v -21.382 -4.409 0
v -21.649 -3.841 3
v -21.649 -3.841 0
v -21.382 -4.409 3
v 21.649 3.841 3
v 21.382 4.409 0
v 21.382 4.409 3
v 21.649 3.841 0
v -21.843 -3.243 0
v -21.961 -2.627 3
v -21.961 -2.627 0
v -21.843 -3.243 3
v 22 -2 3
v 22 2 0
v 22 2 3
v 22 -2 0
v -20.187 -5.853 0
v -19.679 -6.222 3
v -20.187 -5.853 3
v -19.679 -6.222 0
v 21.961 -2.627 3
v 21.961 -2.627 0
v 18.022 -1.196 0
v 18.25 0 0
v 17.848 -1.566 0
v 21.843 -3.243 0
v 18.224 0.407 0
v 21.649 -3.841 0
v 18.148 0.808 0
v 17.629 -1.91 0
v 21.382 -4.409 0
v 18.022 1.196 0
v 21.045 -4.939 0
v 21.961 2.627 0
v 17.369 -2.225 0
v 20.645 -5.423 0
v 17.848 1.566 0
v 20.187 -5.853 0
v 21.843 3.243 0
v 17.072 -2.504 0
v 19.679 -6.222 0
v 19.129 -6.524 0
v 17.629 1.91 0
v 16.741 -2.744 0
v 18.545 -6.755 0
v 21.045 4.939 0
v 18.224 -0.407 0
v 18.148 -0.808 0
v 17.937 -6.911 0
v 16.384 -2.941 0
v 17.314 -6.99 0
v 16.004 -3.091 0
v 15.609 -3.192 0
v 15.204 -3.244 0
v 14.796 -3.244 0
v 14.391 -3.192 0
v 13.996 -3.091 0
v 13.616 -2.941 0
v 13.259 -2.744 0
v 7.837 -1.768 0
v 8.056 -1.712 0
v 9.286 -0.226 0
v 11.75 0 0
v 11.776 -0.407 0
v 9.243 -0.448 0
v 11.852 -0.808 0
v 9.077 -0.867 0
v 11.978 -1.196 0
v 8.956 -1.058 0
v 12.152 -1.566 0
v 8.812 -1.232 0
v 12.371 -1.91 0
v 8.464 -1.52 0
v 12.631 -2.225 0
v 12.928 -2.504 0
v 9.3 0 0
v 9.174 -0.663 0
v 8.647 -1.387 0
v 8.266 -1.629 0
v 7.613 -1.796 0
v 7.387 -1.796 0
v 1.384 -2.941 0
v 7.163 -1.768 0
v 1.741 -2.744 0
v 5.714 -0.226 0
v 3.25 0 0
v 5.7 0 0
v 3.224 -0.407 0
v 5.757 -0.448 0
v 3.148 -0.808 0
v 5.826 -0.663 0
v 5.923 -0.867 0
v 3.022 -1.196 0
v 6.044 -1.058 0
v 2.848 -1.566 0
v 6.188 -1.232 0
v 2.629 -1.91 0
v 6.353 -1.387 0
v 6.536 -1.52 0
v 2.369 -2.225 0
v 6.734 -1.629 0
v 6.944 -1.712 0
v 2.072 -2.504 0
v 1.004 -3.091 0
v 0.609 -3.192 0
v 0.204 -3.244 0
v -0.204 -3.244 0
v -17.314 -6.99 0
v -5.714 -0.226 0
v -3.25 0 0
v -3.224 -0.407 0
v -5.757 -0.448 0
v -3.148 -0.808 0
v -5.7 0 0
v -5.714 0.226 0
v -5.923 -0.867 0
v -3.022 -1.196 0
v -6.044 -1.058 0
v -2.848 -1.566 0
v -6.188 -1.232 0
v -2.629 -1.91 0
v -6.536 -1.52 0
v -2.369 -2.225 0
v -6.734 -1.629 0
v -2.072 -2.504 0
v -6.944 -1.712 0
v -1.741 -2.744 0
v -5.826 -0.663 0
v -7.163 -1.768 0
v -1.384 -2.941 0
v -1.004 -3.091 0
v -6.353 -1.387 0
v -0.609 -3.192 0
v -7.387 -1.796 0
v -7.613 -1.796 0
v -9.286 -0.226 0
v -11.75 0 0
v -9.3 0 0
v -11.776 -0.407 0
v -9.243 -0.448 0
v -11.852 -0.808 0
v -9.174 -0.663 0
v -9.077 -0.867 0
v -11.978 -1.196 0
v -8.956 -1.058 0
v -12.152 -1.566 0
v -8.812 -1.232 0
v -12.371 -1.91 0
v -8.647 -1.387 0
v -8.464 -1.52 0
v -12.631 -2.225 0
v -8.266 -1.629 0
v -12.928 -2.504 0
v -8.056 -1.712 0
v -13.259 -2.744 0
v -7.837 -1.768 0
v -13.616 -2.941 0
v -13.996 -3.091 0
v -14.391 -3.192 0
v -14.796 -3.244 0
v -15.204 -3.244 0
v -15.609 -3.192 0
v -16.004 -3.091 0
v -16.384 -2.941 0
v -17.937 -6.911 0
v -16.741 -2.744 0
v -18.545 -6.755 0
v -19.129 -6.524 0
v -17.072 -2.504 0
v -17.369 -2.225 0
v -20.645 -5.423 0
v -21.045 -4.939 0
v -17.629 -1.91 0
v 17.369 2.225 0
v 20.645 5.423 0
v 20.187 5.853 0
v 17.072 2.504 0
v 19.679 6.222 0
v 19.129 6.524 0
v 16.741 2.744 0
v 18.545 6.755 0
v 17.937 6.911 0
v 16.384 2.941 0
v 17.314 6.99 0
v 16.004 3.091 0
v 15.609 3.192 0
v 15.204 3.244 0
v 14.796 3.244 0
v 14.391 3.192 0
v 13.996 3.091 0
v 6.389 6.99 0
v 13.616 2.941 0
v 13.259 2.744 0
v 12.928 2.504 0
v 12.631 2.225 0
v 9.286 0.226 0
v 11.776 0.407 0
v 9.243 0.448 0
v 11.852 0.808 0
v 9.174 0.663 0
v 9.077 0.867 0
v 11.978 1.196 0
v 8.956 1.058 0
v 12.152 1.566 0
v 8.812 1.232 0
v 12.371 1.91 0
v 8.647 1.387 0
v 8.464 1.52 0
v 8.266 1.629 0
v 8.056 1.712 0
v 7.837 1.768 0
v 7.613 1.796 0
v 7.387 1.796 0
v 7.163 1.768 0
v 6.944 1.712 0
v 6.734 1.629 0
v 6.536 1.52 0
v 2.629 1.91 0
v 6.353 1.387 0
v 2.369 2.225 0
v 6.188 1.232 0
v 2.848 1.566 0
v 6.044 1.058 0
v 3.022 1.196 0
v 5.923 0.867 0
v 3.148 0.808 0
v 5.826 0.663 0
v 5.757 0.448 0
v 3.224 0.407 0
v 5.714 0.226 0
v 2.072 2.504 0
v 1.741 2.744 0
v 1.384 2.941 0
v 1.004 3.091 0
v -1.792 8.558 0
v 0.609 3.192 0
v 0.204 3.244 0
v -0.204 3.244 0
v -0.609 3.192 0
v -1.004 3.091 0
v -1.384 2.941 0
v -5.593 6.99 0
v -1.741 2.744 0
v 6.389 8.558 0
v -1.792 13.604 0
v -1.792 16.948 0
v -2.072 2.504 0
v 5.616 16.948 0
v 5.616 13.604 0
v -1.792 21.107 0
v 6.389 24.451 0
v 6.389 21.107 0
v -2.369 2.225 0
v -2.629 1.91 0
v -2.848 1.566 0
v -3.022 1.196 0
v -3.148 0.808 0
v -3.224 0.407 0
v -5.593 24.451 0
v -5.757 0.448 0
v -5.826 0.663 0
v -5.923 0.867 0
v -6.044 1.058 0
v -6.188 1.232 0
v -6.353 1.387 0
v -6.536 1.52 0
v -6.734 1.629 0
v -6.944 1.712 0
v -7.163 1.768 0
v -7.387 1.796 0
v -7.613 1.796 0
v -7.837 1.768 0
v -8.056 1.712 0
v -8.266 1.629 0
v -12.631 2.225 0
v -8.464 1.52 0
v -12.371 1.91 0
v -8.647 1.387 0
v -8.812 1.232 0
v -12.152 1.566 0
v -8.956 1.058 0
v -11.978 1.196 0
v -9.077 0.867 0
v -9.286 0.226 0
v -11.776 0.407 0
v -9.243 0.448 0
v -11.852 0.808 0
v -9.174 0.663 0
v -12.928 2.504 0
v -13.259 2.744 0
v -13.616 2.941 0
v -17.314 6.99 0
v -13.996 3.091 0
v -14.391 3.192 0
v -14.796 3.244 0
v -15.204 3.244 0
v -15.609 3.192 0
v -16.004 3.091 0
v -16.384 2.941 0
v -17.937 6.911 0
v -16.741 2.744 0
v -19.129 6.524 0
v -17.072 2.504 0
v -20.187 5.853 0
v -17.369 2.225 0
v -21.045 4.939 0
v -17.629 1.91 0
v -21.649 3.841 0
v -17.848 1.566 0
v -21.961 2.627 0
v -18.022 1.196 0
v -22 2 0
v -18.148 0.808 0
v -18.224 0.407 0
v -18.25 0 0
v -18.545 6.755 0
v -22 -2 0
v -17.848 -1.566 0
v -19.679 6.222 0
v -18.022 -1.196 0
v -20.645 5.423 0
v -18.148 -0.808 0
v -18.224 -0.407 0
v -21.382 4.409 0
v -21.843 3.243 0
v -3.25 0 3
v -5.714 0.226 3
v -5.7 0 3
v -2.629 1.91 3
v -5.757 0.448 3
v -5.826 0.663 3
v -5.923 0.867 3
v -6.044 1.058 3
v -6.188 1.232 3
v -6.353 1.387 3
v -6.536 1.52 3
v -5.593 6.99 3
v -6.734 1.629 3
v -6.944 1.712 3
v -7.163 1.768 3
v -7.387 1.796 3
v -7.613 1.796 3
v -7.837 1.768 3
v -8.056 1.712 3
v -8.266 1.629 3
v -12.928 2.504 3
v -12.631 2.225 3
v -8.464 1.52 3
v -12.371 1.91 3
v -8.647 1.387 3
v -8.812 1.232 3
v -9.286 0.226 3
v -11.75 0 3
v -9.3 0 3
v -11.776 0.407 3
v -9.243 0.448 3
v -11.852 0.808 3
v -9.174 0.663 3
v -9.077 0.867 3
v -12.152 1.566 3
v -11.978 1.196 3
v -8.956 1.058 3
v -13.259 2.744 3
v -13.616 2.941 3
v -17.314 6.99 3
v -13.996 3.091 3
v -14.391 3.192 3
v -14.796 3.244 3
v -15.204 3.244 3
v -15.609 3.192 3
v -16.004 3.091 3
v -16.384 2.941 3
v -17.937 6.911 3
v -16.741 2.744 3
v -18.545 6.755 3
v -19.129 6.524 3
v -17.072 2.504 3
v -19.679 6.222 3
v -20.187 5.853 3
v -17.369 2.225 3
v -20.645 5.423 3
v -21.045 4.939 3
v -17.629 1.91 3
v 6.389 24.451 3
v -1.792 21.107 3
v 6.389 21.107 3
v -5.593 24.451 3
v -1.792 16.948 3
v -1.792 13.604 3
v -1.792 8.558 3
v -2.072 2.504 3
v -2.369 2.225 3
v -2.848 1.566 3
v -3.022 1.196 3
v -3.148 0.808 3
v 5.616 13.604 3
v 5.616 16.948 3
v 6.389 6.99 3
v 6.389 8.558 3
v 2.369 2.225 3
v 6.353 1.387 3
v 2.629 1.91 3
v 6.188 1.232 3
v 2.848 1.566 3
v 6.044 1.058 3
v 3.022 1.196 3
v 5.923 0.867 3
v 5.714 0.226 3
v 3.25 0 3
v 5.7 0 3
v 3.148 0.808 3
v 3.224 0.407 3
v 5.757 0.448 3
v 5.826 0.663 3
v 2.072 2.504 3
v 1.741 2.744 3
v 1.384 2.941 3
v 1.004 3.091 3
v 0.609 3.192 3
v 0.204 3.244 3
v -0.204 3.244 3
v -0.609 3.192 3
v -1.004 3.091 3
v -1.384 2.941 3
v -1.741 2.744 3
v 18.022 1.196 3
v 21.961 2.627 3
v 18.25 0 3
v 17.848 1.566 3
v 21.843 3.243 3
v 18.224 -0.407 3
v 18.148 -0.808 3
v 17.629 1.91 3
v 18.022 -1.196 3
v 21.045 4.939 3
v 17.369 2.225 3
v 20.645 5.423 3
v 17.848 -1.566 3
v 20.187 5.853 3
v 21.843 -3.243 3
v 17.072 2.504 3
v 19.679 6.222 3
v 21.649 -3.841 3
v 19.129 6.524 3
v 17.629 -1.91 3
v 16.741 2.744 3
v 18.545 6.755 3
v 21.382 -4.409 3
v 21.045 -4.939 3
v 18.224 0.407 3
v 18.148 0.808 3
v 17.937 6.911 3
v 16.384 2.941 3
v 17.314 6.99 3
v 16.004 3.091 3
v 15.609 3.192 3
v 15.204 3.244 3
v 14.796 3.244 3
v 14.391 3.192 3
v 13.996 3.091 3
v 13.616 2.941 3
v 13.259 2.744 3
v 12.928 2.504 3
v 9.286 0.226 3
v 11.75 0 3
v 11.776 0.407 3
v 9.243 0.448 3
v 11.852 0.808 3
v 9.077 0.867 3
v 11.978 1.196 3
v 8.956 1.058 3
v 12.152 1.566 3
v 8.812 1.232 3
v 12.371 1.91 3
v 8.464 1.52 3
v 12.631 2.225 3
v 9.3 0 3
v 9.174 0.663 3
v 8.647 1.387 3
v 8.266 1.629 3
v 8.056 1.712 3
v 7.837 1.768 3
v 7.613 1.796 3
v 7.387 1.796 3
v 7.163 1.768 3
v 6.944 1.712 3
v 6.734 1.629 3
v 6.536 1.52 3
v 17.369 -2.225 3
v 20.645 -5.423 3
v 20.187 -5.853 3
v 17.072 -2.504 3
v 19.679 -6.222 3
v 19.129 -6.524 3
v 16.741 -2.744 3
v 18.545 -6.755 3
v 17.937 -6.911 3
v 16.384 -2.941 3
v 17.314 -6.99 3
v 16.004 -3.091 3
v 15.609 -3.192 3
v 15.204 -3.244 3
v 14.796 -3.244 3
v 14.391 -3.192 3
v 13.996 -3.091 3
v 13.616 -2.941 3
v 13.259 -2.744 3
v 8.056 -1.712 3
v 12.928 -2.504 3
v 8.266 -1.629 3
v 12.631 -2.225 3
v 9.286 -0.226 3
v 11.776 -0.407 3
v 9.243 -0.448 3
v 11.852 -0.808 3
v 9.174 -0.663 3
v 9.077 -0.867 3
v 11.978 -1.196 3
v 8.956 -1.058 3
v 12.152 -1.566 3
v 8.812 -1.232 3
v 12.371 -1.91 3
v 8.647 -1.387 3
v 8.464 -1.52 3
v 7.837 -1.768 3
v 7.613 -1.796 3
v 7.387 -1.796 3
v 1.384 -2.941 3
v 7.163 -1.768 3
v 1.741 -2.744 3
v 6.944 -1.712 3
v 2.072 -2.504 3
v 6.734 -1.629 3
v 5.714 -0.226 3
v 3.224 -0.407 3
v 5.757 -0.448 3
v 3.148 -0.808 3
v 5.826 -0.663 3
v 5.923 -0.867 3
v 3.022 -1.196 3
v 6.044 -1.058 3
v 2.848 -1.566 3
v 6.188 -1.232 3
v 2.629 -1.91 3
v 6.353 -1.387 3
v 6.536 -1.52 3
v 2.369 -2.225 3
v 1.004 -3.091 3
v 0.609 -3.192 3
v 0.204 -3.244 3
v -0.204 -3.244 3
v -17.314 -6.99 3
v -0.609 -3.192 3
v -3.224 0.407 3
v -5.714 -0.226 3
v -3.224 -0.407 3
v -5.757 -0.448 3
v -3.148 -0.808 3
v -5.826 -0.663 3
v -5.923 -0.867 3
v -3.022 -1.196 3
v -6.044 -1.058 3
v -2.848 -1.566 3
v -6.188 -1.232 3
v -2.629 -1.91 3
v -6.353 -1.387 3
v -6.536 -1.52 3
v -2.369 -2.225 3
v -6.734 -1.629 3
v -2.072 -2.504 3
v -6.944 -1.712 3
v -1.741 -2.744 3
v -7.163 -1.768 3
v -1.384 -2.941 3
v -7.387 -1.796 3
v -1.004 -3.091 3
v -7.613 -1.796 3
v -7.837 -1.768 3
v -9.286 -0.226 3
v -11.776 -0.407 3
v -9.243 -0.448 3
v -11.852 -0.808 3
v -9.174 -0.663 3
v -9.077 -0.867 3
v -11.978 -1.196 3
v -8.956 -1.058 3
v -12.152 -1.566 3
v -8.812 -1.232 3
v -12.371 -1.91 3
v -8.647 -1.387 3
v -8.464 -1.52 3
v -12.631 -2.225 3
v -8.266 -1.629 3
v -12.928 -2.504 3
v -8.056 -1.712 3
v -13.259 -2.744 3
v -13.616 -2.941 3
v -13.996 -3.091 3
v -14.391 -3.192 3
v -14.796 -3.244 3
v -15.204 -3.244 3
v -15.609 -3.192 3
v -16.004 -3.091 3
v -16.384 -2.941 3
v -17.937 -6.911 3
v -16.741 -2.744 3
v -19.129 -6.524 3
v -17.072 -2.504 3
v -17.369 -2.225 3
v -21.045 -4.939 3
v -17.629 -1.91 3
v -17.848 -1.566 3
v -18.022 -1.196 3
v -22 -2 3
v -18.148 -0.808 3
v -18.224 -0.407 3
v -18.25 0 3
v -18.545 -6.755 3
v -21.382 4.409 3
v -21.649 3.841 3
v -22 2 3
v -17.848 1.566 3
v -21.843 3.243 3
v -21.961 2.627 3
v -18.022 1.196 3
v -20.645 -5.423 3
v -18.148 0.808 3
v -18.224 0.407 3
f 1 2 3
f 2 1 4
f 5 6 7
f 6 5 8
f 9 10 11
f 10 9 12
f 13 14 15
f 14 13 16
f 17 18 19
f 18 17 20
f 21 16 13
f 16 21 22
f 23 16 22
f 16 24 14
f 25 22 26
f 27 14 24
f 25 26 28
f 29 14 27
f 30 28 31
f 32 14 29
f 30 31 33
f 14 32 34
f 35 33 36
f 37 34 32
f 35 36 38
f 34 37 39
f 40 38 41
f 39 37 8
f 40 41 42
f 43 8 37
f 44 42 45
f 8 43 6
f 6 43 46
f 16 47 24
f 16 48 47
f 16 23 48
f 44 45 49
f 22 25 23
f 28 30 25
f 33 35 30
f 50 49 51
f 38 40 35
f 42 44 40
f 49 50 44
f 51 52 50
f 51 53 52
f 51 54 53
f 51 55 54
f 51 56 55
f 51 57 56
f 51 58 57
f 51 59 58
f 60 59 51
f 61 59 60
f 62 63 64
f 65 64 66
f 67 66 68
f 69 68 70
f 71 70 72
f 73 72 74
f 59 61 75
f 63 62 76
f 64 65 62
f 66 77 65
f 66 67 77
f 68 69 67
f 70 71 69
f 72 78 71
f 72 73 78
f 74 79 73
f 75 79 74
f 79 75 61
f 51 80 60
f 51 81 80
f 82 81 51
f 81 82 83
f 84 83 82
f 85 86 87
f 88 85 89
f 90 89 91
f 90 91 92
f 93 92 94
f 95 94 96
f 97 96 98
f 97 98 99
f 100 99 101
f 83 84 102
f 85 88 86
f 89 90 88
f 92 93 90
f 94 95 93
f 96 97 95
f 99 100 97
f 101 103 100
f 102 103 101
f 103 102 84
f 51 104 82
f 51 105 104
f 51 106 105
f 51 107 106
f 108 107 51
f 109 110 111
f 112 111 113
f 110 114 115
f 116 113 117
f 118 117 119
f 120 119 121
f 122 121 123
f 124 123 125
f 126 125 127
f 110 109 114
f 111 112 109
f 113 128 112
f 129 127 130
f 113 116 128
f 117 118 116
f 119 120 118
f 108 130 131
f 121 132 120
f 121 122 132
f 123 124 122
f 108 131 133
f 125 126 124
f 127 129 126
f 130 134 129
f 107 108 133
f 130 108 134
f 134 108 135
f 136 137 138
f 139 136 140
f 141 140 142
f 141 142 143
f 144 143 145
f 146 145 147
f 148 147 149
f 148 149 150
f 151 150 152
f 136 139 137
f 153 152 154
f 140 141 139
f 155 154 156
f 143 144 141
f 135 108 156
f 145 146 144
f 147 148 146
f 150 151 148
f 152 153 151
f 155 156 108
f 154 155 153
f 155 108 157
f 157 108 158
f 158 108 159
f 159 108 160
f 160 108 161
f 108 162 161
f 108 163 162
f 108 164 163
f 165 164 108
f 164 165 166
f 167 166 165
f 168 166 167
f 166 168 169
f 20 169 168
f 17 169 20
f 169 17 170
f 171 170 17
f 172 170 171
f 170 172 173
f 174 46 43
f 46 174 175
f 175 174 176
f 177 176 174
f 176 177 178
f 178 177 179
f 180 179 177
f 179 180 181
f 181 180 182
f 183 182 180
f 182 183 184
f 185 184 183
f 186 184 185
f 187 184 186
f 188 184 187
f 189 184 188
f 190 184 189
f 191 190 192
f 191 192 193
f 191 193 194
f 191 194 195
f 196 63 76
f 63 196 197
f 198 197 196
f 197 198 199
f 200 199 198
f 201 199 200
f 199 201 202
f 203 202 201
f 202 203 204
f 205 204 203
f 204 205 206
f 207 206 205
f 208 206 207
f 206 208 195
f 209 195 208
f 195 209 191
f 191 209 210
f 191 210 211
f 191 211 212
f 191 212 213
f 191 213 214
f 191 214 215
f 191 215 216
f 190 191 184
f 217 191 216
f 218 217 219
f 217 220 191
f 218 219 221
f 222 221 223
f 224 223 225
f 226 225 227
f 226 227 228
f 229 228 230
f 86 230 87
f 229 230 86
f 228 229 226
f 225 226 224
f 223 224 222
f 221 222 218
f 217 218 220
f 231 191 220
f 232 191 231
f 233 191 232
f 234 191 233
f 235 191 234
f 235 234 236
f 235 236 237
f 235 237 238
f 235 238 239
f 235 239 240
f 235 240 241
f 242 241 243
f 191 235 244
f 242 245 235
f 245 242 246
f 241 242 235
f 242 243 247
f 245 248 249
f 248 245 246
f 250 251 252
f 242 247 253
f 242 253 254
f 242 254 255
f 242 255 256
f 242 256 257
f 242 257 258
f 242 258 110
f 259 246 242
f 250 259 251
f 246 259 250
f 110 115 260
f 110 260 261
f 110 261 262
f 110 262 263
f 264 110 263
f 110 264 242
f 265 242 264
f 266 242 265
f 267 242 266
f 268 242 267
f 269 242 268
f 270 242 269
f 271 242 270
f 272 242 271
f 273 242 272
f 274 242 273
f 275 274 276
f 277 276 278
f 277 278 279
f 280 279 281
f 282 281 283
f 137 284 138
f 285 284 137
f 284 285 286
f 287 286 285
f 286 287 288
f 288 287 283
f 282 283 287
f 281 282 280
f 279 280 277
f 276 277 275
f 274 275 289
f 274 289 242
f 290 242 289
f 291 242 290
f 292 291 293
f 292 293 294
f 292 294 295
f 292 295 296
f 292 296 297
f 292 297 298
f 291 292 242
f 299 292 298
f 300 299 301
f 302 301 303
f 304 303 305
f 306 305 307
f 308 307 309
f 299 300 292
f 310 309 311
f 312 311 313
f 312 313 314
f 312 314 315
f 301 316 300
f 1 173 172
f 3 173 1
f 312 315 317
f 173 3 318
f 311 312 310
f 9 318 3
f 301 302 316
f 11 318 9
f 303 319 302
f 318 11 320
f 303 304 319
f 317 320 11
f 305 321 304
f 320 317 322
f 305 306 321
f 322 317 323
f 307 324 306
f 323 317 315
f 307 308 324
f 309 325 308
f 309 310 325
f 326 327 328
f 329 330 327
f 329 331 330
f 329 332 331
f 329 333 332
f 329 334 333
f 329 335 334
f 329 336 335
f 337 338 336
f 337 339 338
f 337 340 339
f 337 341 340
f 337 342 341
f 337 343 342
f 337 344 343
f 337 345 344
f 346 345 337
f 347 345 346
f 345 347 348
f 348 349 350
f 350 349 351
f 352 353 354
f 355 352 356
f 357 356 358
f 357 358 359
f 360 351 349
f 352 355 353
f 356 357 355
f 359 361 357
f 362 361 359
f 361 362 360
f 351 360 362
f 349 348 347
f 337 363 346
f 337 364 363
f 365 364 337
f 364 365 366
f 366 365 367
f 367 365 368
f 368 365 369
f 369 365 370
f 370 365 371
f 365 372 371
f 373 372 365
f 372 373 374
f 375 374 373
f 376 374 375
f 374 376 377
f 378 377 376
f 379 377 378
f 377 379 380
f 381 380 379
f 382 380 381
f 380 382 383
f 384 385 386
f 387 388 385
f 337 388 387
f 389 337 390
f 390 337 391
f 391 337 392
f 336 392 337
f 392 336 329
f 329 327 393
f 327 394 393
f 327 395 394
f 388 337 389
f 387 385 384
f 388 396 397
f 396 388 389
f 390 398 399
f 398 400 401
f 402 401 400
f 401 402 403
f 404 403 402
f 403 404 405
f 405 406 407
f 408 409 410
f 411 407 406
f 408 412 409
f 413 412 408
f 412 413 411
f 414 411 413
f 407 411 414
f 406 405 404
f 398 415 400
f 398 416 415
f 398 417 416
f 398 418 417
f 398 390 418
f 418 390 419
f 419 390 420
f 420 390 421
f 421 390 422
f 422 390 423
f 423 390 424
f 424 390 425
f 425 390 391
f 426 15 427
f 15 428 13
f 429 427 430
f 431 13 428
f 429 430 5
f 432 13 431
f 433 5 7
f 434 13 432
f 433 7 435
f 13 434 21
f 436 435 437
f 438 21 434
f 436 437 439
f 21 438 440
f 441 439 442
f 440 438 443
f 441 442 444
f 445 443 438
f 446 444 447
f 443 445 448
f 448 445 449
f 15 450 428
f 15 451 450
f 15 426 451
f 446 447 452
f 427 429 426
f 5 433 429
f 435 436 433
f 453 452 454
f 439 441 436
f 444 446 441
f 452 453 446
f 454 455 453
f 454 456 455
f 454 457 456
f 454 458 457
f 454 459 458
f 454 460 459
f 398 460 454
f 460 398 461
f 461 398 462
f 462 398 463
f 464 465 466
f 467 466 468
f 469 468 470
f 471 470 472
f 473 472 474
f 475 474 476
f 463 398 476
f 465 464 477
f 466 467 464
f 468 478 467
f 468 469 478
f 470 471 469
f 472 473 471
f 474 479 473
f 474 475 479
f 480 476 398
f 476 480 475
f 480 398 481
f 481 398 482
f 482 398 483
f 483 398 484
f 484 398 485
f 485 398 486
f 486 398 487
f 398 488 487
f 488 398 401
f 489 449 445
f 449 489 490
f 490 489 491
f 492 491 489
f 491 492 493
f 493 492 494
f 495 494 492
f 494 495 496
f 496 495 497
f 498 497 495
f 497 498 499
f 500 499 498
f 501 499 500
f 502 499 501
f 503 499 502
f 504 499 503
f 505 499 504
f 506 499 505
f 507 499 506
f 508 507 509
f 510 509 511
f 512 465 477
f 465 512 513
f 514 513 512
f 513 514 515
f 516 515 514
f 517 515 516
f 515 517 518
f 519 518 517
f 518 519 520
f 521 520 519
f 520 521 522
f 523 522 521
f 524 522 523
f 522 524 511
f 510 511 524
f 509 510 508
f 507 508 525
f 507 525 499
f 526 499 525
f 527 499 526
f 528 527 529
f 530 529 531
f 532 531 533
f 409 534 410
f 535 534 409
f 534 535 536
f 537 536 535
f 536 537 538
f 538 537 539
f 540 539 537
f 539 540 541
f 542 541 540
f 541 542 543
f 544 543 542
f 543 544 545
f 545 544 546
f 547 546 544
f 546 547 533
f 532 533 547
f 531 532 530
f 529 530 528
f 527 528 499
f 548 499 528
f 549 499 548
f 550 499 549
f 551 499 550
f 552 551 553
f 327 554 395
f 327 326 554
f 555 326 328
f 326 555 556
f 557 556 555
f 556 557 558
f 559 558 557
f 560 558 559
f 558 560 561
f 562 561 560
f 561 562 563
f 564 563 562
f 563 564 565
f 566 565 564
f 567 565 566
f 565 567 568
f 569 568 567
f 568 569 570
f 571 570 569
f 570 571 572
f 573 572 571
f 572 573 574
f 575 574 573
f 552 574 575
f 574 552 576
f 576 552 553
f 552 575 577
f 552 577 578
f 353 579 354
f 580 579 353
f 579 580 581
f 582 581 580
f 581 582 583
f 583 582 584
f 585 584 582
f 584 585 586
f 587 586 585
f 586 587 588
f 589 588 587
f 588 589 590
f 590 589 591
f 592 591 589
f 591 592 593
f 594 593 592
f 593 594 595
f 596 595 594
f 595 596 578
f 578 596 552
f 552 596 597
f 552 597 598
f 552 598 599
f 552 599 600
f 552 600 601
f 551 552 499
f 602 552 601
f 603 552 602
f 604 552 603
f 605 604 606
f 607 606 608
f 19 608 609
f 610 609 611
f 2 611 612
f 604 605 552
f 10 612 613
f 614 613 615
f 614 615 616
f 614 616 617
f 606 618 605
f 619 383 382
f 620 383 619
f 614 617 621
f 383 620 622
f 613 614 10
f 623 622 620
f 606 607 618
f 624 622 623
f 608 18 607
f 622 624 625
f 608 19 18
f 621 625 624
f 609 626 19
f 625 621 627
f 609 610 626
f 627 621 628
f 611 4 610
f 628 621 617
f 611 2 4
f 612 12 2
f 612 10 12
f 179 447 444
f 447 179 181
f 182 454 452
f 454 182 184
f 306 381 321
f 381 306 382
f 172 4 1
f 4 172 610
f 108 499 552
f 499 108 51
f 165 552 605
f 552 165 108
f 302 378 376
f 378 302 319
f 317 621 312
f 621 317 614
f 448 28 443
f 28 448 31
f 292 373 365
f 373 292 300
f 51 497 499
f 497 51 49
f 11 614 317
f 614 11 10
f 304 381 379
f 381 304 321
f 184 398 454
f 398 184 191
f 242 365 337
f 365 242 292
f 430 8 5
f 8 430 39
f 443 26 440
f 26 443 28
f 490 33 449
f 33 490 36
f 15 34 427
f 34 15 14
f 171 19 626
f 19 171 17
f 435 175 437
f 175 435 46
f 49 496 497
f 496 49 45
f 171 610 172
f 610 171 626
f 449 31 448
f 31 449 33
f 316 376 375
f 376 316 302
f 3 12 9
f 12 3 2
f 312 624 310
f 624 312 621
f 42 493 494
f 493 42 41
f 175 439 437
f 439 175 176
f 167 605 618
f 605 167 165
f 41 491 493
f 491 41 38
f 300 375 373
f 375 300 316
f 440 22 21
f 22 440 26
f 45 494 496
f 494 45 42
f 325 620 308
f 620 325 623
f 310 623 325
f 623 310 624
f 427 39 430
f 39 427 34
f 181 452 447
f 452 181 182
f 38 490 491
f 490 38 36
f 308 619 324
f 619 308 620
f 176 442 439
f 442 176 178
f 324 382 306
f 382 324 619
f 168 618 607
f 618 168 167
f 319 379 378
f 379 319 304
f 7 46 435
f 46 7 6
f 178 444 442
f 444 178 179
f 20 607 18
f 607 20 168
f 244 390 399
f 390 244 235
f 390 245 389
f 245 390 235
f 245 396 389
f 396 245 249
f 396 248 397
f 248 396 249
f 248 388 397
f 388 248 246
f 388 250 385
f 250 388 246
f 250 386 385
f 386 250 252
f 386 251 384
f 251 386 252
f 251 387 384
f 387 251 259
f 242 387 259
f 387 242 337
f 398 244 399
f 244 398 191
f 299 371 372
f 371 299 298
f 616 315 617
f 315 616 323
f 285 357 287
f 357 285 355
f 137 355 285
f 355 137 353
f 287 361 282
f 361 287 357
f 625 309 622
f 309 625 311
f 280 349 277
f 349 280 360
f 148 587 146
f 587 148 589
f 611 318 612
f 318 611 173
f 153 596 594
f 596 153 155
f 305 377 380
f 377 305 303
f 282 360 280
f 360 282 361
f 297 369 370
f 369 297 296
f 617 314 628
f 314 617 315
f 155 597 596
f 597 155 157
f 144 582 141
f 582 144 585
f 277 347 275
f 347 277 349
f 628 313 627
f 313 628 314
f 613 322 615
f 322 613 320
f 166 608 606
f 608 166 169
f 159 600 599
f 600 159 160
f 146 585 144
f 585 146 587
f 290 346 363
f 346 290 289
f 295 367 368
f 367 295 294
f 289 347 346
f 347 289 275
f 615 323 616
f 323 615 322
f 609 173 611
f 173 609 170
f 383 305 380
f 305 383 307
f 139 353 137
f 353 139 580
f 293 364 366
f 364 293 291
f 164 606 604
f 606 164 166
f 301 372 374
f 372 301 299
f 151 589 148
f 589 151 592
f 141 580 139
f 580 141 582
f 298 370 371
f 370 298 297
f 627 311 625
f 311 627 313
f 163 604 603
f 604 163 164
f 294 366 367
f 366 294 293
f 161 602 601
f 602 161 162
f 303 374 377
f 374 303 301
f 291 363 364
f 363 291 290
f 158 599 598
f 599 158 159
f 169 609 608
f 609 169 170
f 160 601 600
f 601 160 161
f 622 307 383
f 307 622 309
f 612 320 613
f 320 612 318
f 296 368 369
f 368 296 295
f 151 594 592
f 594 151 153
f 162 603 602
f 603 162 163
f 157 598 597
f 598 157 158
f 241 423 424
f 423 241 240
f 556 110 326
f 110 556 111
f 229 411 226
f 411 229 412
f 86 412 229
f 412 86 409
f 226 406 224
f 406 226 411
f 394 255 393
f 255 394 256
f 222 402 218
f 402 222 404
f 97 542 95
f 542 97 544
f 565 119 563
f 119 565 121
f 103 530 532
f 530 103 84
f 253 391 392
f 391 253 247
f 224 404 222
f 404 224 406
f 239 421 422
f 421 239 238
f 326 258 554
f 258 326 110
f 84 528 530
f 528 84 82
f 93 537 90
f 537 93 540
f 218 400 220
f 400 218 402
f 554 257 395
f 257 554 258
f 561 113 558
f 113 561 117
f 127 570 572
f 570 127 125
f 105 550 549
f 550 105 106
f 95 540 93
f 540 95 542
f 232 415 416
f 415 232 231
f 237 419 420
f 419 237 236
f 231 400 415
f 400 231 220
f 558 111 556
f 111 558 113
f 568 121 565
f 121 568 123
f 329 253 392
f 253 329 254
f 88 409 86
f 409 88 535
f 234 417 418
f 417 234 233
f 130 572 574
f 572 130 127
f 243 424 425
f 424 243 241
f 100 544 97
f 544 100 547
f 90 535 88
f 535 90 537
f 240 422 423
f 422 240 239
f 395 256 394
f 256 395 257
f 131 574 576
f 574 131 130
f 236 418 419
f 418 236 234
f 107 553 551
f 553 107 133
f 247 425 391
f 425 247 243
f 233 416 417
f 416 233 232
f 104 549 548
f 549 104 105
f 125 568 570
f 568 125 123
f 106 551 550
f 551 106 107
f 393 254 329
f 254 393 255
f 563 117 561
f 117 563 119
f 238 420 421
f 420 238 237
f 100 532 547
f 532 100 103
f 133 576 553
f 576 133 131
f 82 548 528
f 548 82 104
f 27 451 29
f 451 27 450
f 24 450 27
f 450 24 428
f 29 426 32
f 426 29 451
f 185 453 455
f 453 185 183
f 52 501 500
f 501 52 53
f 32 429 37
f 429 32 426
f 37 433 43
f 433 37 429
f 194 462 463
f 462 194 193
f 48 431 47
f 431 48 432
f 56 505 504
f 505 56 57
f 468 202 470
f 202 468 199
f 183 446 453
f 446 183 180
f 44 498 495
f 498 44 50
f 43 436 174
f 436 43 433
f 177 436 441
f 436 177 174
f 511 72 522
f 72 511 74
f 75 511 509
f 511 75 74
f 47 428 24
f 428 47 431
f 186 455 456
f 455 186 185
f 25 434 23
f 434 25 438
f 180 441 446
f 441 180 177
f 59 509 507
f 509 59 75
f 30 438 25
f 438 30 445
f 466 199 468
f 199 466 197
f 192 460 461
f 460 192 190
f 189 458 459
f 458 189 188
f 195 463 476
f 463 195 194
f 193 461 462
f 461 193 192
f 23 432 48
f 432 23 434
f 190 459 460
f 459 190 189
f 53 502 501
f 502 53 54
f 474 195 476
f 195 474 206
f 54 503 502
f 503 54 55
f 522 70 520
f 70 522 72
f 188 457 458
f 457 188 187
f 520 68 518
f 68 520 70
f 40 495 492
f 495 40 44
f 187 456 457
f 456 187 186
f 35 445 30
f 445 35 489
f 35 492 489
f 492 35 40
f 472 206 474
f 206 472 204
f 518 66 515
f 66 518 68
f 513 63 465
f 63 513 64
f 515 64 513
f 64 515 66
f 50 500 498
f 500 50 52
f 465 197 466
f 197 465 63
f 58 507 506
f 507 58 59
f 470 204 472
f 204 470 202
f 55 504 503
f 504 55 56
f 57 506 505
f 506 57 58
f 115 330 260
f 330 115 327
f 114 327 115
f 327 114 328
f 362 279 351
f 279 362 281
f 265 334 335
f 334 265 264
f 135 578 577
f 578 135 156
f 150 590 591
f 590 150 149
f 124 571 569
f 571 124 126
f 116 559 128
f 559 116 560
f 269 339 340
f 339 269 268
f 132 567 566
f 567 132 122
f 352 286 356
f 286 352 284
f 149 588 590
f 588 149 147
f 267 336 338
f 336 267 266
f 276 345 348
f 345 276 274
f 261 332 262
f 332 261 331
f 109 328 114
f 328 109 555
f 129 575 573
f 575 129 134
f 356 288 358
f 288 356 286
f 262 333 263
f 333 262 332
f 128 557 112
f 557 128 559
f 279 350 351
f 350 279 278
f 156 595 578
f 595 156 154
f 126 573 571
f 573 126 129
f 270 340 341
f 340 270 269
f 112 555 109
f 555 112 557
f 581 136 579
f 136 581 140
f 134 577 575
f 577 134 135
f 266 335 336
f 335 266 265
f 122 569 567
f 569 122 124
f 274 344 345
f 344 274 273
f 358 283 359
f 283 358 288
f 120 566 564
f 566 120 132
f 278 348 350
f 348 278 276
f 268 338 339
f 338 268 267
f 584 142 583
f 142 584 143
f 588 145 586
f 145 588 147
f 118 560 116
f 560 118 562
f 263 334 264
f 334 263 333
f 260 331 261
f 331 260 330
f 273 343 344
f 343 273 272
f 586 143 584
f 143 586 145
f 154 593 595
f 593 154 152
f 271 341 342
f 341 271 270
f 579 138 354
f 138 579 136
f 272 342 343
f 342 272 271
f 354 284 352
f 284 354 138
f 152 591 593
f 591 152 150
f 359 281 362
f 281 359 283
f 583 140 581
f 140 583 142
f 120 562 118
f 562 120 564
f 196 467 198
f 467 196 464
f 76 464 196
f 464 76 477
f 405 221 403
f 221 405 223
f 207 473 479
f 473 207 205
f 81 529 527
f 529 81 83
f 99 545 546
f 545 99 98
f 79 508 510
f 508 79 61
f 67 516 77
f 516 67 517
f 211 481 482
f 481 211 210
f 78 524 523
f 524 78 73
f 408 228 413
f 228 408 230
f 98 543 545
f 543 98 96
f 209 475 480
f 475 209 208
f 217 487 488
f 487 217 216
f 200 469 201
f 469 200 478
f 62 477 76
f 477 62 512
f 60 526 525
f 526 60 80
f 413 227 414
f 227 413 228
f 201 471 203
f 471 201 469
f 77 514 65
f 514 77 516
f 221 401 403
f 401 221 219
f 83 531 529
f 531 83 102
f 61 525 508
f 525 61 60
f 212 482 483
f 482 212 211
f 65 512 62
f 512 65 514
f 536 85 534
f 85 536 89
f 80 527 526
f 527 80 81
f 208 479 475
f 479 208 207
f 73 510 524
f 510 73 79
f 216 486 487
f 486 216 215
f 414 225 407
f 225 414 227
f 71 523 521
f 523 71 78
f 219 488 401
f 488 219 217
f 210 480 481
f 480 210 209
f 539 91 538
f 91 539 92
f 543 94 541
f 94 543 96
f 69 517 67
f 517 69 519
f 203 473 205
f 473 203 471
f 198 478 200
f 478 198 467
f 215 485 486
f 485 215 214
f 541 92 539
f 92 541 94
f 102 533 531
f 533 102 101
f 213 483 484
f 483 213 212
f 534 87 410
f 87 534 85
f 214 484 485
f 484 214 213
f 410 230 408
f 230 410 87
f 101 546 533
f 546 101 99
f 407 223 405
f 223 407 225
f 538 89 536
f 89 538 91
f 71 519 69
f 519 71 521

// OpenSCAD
$fn = 50;


difference() {
	union() {
		hull() {
			translate(v = [-17.0000000000, 2.0000000000, 0]) {
				cylinder(h = 3, r = 5);
			}
			translate(v = [17.0000000000, 2.0000000000, 0]) {
				cylinder(h = 3, r = 5);
			}
			translate(v = [-17.0000000000, -2.0000000000, 0]) {
				cylinder(h = 3, r = 5);
			}
			translate(v = [17.0000000000, -2.0000000000, 0]) {
				cylinder(h = 3, r = 5);
			}
		}
		translate(v = [0, 24, 0]) {
			linear_extrude(height = 3) {
				text(font = "DejaVu Sans Mono:style=Bold", halign = "center", size = 19.0000000000, text = "E", valign = "top");
			}
		}
	}
	union() {
		translate(v = [-15.0000000000, 0.0000000000, 0]) {
			translate(v = [0, 0, -100]) {
				cylinder(h = 200, r = 3.2500000000);
			}
		}
		translate(v = [0, 0, -100]) {
			cylinder(h = 200, r = 3.2500000000);
		}
		translate(v = [15.0000000000, 0.0000000000, 0]) {
			translate(v = [0, 0, -100]) {
				cylinder(h = 200, r = 3.2500000000);
			}
		}
		translate(v = [-15.0000000000, 0.0000000000, 0]) {
			translate(v = [0, 0, -100]) {
				cylinder(h = 200, r = 1.8000000000);
			}
		}
		translate(v = [-7.5000000000, 0.0000000000, 0]) {
			translate(v = [0, 0, -100]) {
				cylinder(h = 200, r = 1.8000000000);
			}
		}
		translate(v = [0, 0, -100]) {
			cylinder(h = 200, r = 1.8000000000);
		}
		translate(v = [7.5000000000, 0.0000000000, 0]) {
			translate(v = [0, 0, -100]) {
				cylinder(h = 200, r = 1.8000000000);
			}
		}
		translate(v = [15.0000000000, 0.0000000000, 0]) {
			translate(v = [0, 0, -100]) {
				cylinder(h = 200, r = 1.8000000000);
			}
		}
	}
}
